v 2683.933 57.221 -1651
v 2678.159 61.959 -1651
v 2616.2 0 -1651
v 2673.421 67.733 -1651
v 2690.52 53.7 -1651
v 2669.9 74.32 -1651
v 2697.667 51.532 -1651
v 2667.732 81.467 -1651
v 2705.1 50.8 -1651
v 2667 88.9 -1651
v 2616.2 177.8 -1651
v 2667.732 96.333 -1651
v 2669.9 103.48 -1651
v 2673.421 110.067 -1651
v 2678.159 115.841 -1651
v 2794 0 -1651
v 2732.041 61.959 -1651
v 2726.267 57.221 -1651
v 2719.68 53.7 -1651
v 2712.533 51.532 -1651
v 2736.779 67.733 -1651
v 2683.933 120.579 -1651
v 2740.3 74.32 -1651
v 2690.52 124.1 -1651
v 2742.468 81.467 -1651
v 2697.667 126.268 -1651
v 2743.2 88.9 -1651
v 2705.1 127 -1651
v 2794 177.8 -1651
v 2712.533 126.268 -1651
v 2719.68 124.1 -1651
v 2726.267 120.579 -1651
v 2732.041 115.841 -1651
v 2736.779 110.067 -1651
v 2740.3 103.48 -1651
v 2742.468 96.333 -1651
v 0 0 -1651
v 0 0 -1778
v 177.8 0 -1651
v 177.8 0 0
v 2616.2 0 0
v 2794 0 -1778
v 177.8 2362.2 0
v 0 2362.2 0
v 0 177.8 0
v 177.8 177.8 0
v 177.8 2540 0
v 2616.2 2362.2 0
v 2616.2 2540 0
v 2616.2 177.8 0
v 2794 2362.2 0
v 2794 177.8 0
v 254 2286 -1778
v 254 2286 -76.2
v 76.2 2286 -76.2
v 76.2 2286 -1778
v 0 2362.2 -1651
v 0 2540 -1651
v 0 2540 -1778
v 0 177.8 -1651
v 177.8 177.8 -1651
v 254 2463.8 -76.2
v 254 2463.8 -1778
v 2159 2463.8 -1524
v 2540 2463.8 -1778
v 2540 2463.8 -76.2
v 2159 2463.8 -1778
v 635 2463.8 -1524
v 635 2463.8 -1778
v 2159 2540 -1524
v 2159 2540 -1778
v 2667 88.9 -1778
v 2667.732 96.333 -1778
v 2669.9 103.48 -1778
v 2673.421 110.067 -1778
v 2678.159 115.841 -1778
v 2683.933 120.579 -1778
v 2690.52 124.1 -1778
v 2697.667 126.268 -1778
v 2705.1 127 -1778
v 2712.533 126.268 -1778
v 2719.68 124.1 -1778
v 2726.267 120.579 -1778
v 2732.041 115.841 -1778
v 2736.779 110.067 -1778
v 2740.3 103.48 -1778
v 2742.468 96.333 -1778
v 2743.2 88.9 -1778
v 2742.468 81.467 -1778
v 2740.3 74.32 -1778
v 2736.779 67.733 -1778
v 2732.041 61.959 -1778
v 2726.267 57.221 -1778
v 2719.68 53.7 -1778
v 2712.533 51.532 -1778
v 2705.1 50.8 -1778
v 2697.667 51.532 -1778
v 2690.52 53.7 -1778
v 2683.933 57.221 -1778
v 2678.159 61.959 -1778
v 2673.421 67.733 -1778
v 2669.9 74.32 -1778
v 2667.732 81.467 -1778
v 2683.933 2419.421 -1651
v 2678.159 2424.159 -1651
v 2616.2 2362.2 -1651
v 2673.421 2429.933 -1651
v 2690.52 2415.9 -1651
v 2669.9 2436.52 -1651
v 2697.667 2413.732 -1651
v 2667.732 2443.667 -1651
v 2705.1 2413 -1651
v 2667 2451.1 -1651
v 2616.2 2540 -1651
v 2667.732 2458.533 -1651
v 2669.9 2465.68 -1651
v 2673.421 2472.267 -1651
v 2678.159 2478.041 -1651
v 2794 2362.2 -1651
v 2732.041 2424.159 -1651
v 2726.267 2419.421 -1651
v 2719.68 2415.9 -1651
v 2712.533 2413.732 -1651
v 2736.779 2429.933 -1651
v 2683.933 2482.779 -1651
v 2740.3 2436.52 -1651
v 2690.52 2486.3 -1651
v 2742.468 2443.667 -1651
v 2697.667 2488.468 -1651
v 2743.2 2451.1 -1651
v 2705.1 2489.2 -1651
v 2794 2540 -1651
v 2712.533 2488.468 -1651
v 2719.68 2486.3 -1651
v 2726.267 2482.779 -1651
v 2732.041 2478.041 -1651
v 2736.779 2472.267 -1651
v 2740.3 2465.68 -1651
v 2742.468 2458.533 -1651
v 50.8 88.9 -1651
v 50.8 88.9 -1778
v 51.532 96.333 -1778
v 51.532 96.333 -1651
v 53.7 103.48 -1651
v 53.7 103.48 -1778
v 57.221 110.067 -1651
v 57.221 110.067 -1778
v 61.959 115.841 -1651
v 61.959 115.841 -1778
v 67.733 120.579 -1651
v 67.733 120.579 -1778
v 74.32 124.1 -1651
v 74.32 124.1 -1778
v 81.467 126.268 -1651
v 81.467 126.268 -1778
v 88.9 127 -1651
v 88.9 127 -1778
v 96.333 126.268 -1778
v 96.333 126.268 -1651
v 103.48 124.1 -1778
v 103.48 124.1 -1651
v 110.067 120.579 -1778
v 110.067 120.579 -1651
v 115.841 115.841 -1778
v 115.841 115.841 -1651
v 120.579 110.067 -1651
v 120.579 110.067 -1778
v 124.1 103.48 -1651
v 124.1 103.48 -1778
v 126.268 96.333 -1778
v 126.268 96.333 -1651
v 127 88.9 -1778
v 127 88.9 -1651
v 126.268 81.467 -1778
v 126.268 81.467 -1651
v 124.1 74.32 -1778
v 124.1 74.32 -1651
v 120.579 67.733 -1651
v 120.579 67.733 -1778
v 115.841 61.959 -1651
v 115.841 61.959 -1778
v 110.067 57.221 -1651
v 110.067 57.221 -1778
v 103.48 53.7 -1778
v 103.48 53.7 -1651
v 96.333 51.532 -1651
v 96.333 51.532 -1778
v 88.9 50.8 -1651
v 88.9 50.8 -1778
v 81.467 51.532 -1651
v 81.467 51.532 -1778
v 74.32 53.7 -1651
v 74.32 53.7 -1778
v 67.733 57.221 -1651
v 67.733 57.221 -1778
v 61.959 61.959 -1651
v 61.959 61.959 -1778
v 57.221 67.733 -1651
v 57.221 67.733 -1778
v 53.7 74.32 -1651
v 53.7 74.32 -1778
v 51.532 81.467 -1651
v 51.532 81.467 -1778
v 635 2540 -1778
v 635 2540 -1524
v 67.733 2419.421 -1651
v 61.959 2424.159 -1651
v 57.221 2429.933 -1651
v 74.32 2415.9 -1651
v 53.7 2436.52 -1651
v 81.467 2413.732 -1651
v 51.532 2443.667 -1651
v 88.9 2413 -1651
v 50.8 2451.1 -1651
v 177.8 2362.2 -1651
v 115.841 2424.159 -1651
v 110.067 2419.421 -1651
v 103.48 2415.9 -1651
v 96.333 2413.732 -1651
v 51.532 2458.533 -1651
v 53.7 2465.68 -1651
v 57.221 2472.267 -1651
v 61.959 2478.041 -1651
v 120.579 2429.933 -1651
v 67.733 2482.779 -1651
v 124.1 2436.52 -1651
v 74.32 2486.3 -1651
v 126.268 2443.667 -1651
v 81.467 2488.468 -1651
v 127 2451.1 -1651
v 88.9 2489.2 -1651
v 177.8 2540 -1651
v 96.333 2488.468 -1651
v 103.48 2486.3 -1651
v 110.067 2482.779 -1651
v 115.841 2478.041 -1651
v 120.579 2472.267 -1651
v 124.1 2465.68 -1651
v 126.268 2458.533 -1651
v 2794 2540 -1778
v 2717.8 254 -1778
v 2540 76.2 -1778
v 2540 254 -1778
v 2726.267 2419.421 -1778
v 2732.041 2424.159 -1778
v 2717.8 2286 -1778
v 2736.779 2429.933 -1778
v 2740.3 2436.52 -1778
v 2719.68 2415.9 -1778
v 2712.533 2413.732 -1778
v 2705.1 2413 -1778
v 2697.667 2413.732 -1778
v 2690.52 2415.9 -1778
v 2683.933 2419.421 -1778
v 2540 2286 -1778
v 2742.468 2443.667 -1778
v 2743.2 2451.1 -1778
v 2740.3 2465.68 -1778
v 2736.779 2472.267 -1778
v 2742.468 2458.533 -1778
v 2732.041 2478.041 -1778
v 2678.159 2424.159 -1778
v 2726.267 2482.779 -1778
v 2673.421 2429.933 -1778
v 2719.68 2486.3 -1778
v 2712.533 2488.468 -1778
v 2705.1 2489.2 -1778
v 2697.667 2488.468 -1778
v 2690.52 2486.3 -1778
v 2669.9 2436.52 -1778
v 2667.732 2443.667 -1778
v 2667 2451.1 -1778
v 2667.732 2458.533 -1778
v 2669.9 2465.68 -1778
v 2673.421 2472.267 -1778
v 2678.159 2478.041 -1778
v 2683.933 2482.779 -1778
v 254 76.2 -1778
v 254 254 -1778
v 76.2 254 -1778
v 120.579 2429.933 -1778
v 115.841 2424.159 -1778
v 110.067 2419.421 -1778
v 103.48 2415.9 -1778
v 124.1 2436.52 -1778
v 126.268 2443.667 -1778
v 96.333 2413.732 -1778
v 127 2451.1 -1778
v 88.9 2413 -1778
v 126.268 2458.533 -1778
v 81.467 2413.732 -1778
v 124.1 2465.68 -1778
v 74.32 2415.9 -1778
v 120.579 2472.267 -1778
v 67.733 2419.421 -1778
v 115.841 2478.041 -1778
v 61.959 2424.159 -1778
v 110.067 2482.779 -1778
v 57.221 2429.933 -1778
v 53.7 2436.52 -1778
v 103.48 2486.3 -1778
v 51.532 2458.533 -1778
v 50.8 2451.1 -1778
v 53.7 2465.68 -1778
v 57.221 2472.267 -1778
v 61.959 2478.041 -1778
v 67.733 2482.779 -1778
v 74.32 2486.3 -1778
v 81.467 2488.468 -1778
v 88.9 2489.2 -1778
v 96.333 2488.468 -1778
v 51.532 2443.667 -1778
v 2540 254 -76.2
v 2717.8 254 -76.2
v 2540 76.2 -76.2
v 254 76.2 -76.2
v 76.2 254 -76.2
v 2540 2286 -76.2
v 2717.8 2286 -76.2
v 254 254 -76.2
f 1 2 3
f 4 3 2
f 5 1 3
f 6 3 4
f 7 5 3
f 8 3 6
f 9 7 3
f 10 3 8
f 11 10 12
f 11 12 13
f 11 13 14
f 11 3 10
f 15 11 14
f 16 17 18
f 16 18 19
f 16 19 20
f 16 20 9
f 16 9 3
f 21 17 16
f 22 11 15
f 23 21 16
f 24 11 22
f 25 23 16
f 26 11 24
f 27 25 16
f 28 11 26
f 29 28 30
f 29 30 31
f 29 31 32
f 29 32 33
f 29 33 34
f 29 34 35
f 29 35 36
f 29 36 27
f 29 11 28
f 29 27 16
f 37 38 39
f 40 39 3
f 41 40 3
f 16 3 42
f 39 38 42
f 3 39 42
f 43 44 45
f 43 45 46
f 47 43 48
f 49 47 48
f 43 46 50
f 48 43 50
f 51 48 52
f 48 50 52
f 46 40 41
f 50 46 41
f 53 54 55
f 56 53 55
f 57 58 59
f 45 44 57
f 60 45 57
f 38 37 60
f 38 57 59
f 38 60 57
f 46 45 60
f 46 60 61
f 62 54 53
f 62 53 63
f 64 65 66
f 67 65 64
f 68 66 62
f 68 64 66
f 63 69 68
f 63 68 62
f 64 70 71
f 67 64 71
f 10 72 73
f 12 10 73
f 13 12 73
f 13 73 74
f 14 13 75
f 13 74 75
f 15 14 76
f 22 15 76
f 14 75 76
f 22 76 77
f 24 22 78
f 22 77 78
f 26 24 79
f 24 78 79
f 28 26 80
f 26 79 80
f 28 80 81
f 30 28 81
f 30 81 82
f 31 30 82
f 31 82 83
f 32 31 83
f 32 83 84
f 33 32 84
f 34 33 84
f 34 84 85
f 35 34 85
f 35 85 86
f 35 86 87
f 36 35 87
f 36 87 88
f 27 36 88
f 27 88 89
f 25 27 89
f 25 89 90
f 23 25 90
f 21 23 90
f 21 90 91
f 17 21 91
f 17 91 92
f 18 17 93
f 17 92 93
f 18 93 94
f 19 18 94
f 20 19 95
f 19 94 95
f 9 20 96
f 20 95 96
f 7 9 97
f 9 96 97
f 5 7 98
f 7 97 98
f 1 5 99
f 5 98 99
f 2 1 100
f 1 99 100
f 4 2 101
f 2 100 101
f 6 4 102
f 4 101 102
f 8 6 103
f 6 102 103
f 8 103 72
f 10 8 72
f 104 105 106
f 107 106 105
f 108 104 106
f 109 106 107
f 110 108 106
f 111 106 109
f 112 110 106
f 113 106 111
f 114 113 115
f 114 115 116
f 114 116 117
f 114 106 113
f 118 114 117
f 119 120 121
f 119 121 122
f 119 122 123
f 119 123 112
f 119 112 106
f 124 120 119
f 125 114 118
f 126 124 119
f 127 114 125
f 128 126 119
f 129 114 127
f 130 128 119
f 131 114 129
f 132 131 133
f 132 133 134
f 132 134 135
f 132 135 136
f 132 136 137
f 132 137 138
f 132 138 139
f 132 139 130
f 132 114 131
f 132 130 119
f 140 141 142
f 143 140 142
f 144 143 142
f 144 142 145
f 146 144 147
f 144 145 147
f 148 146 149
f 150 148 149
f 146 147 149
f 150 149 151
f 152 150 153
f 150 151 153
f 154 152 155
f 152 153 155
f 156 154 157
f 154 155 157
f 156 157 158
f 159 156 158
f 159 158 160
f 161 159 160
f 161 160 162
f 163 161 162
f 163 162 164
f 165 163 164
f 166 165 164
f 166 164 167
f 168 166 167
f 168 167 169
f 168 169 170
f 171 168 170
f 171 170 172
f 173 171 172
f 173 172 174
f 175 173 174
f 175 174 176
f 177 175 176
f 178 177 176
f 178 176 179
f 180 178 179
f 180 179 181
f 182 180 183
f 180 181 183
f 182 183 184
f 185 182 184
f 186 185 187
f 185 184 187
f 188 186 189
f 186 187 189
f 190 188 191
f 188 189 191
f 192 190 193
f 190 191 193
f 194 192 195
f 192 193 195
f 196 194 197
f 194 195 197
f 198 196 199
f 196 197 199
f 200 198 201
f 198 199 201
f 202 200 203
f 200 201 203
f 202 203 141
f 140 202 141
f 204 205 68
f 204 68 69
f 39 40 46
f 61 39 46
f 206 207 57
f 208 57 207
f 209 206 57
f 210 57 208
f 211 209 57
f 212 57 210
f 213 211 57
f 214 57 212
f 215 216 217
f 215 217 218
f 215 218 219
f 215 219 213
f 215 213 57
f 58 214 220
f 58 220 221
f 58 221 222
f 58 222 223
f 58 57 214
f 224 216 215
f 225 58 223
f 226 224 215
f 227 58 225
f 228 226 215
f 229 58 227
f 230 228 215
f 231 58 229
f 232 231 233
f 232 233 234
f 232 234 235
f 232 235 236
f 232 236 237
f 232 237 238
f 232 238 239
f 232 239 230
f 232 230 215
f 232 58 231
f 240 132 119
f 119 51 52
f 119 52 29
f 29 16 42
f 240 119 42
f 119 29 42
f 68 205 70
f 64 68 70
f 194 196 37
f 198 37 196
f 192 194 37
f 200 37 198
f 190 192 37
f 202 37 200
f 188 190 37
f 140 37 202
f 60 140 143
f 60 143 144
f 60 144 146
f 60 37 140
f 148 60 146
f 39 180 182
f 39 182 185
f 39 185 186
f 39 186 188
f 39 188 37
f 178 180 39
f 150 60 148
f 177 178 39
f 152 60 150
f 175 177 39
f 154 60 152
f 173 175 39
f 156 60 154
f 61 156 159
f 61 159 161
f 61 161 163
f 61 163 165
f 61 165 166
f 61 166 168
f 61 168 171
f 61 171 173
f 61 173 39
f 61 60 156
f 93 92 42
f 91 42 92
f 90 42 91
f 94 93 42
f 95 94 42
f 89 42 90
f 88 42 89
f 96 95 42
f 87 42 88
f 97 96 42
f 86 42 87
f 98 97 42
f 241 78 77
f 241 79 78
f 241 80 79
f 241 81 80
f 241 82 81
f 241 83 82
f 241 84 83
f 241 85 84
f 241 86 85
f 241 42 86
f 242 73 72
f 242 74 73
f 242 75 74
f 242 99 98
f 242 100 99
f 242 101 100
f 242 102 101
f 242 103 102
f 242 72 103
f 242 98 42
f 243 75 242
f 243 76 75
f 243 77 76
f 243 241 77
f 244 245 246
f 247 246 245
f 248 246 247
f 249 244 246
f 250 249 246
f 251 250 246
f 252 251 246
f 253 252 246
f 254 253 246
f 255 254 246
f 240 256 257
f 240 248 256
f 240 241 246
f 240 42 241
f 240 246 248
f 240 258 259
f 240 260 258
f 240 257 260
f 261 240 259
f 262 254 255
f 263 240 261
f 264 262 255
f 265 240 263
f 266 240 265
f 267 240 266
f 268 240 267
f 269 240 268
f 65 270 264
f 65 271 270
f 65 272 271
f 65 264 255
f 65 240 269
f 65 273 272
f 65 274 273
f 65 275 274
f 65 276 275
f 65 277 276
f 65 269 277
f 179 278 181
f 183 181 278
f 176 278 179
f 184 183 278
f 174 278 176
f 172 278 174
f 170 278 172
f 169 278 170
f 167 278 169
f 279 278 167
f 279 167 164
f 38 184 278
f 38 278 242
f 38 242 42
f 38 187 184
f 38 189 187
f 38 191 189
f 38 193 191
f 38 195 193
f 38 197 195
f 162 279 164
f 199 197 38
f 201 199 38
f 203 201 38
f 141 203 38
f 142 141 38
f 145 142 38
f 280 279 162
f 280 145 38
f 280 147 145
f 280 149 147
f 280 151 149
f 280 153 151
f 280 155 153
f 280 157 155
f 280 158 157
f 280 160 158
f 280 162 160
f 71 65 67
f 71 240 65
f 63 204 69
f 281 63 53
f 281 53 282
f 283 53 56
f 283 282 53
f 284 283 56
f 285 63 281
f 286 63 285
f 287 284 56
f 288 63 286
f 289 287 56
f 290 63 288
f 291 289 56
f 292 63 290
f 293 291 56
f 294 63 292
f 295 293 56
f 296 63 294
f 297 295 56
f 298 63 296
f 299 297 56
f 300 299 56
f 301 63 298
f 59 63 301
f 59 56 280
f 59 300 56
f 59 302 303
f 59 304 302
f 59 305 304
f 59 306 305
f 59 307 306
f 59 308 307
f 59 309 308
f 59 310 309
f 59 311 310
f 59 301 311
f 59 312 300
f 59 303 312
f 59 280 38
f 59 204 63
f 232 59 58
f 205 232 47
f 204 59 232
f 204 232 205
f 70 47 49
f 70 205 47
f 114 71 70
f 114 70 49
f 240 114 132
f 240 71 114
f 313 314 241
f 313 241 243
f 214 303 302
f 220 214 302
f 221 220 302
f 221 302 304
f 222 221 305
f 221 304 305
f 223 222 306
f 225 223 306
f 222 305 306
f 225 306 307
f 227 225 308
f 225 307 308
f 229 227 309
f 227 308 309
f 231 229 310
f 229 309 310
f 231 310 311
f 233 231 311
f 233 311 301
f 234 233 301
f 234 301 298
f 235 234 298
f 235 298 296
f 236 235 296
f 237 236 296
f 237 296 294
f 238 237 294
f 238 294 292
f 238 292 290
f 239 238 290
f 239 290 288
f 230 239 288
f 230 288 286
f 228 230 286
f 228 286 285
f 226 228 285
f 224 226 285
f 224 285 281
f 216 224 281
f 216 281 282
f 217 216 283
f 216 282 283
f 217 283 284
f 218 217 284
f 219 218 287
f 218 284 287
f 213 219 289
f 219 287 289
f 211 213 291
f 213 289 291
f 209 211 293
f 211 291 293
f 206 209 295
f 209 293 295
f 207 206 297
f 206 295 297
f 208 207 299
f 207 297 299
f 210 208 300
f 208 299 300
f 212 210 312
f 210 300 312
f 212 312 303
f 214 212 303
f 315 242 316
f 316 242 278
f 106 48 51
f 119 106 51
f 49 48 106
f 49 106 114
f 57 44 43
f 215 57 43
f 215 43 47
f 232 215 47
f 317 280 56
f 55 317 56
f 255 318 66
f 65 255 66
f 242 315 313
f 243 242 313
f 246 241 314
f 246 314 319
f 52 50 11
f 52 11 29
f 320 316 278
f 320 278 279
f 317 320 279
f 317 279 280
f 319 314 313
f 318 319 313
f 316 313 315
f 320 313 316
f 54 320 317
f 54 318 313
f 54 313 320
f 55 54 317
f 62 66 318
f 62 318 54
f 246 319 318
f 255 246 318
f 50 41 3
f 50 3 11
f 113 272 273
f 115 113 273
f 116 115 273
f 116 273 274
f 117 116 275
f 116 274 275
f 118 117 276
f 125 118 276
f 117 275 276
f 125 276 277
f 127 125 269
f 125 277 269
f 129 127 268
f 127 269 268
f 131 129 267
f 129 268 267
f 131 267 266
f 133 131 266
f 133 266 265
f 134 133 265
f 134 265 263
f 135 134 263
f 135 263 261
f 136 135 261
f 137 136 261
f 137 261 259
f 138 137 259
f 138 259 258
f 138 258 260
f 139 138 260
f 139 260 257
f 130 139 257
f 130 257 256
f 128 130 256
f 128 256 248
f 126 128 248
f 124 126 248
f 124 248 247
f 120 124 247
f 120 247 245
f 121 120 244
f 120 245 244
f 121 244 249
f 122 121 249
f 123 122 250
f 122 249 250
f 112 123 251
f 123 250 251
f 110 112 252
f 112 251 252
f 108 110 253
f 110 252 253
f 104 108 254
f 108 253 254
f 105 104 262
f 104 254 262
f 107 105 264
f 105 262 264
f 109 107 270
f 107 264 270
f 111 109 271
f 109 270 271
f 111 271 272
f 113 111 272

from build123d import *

# Parameters (mm, degrees)
SKETCH1_W           = 2794
SKETCH1_H           = 1778
BOSS_EXTRUDE1_DEPTH = 2540
SKETCH2_W           = 2641.6
SKETCH2_H           = 2387.6
CUT_EXTRUDE1_DEPTH  = 1701.8
SKETCH3_W           = 177.8
SKETCH3_H           = 177.8
BOSS_EXTRUDE2_DEPTH = 1701.8
SKETCH4_W           = 177.8
SKETCH4_H           = 177.8
CUT_EXTRUDE2_DEPTH  = 1651
SKETCH5_R           = 38.1
CUT_EXTRUDE5_DEPTH  = 1651
SKETCH6_W           = 1524
SKETCH6_H           = 254
CUT_EXTRUDE6_DEPTH  = 254


with BuildPart() as part:
    # Sketch1 → Boss-Extrude1 (new body)
    with BuildSketch(Plane(origin=(0, 0, 0), x_dir=(1, 0, 0), z_dir=(0, 1, 0))):
        with Locations((1397, 889)):
            Rectangle(SKETCH1_W, SKETCH1_H)
    extrude(amount=BOSS_EXTRUDE1_DEPTH)

    # Sketch2 → Cut-Extrude1 (cut)
    with BuildSketch(Plane(origin=(0, 0, -1778), x_dir=(-1, 0, 0), z_dir=(0, 0, -1))):
        with Locations((-1397, 1270)):
            Rectangle(SKETCH2_W, SKETCH2_H)
    extrude(amount=-CUT_EXTRUDE1_DEPTH, mode=Mode.SUBTRACT)

    # Sketch3 → Boss-Extrude2 (add)
    with BuildSketch(Plane(origin=(0, 0, -76.2), x_dir=(-1, 0, 0), z_dir=(0, 0, -1))):
        with Locations((-2628.9, 2374.9)):
            Rectangle(SKETCH3_W, SKETCH3_H)
        with Locations((-165.1, 2374.9)):
            Rectangle(SKETCH3_W, SKETCH3_H)
        with Locations((-2628.9, 165.1)):
            Rectangle(SKETCH3_W, SKETCH3_H)
        with Locations((-165.1, 165.1)):
            Rectangle(SKETCH3_W, SKETCH3_H)
    extrude(amount=BOSS_EXTRUDE2_DEPTH)

    # Sketch4 → Cut-Extrude2 (cut)
    with BuildSketch(Plane.XY):
        with Locations((88.9, 2451.1)):
            Rectangle(SKETCH4_W, SKETCH4_H)
        with Locations((2705.1, 2451.1)):
            Rectangle(SKETCH4_W, SKETCH4_H)
        with Locations((88.9, 88.9)):
            Rectangle(SKETCH4_W, SKETCH4_H)
        with Locations((2705.1, 88.9)):
            Rectangle(SKETCH4_W, SKETCH4_H)
    extrude(amount=-CUT_EXTRUDE2_DEPTH, mode=Mode.SUBTRACT)

    # Sketch5 → Cut-Extrude5 (cut)
    with BuildSketch(Plane(origin=(0, 0, -1778), x_dir=(-1, 0, 0), z_dir=(0, 0, -1))):
        with Locations((-2705.1, 2451.1)):
            Circle(SKETCH5_R)
        with Locations((-2705.1, 88.9)):
            Circle(SKETCH5_R)
        with Locations((-88.9, 2451.1)):
            Circle(SKETCH5_R)
        with Locations((-88.9, 88.9)):
            Circle(SKETCH5_R)
    extrude(amount=-CUT_EXTRUDE5_DEPTH, mode=Mode.SUBTRACT)

    # Sketch6 → Cut-Extrude6 (cut)
    with BuildSketch(Plane(origin=(0, 2540, 0), x_dir=(1, 0, 0), z_dir=(0, 1, 0))):
        with Locations((1397, 1651)):
            Rectangle(SKETCH6_W, SKETCH6_H)
    extrude(amount=-CUT_EXTRUDE6_DEPTH, mode=Mode.SUBTRACT)


solid = part.part
